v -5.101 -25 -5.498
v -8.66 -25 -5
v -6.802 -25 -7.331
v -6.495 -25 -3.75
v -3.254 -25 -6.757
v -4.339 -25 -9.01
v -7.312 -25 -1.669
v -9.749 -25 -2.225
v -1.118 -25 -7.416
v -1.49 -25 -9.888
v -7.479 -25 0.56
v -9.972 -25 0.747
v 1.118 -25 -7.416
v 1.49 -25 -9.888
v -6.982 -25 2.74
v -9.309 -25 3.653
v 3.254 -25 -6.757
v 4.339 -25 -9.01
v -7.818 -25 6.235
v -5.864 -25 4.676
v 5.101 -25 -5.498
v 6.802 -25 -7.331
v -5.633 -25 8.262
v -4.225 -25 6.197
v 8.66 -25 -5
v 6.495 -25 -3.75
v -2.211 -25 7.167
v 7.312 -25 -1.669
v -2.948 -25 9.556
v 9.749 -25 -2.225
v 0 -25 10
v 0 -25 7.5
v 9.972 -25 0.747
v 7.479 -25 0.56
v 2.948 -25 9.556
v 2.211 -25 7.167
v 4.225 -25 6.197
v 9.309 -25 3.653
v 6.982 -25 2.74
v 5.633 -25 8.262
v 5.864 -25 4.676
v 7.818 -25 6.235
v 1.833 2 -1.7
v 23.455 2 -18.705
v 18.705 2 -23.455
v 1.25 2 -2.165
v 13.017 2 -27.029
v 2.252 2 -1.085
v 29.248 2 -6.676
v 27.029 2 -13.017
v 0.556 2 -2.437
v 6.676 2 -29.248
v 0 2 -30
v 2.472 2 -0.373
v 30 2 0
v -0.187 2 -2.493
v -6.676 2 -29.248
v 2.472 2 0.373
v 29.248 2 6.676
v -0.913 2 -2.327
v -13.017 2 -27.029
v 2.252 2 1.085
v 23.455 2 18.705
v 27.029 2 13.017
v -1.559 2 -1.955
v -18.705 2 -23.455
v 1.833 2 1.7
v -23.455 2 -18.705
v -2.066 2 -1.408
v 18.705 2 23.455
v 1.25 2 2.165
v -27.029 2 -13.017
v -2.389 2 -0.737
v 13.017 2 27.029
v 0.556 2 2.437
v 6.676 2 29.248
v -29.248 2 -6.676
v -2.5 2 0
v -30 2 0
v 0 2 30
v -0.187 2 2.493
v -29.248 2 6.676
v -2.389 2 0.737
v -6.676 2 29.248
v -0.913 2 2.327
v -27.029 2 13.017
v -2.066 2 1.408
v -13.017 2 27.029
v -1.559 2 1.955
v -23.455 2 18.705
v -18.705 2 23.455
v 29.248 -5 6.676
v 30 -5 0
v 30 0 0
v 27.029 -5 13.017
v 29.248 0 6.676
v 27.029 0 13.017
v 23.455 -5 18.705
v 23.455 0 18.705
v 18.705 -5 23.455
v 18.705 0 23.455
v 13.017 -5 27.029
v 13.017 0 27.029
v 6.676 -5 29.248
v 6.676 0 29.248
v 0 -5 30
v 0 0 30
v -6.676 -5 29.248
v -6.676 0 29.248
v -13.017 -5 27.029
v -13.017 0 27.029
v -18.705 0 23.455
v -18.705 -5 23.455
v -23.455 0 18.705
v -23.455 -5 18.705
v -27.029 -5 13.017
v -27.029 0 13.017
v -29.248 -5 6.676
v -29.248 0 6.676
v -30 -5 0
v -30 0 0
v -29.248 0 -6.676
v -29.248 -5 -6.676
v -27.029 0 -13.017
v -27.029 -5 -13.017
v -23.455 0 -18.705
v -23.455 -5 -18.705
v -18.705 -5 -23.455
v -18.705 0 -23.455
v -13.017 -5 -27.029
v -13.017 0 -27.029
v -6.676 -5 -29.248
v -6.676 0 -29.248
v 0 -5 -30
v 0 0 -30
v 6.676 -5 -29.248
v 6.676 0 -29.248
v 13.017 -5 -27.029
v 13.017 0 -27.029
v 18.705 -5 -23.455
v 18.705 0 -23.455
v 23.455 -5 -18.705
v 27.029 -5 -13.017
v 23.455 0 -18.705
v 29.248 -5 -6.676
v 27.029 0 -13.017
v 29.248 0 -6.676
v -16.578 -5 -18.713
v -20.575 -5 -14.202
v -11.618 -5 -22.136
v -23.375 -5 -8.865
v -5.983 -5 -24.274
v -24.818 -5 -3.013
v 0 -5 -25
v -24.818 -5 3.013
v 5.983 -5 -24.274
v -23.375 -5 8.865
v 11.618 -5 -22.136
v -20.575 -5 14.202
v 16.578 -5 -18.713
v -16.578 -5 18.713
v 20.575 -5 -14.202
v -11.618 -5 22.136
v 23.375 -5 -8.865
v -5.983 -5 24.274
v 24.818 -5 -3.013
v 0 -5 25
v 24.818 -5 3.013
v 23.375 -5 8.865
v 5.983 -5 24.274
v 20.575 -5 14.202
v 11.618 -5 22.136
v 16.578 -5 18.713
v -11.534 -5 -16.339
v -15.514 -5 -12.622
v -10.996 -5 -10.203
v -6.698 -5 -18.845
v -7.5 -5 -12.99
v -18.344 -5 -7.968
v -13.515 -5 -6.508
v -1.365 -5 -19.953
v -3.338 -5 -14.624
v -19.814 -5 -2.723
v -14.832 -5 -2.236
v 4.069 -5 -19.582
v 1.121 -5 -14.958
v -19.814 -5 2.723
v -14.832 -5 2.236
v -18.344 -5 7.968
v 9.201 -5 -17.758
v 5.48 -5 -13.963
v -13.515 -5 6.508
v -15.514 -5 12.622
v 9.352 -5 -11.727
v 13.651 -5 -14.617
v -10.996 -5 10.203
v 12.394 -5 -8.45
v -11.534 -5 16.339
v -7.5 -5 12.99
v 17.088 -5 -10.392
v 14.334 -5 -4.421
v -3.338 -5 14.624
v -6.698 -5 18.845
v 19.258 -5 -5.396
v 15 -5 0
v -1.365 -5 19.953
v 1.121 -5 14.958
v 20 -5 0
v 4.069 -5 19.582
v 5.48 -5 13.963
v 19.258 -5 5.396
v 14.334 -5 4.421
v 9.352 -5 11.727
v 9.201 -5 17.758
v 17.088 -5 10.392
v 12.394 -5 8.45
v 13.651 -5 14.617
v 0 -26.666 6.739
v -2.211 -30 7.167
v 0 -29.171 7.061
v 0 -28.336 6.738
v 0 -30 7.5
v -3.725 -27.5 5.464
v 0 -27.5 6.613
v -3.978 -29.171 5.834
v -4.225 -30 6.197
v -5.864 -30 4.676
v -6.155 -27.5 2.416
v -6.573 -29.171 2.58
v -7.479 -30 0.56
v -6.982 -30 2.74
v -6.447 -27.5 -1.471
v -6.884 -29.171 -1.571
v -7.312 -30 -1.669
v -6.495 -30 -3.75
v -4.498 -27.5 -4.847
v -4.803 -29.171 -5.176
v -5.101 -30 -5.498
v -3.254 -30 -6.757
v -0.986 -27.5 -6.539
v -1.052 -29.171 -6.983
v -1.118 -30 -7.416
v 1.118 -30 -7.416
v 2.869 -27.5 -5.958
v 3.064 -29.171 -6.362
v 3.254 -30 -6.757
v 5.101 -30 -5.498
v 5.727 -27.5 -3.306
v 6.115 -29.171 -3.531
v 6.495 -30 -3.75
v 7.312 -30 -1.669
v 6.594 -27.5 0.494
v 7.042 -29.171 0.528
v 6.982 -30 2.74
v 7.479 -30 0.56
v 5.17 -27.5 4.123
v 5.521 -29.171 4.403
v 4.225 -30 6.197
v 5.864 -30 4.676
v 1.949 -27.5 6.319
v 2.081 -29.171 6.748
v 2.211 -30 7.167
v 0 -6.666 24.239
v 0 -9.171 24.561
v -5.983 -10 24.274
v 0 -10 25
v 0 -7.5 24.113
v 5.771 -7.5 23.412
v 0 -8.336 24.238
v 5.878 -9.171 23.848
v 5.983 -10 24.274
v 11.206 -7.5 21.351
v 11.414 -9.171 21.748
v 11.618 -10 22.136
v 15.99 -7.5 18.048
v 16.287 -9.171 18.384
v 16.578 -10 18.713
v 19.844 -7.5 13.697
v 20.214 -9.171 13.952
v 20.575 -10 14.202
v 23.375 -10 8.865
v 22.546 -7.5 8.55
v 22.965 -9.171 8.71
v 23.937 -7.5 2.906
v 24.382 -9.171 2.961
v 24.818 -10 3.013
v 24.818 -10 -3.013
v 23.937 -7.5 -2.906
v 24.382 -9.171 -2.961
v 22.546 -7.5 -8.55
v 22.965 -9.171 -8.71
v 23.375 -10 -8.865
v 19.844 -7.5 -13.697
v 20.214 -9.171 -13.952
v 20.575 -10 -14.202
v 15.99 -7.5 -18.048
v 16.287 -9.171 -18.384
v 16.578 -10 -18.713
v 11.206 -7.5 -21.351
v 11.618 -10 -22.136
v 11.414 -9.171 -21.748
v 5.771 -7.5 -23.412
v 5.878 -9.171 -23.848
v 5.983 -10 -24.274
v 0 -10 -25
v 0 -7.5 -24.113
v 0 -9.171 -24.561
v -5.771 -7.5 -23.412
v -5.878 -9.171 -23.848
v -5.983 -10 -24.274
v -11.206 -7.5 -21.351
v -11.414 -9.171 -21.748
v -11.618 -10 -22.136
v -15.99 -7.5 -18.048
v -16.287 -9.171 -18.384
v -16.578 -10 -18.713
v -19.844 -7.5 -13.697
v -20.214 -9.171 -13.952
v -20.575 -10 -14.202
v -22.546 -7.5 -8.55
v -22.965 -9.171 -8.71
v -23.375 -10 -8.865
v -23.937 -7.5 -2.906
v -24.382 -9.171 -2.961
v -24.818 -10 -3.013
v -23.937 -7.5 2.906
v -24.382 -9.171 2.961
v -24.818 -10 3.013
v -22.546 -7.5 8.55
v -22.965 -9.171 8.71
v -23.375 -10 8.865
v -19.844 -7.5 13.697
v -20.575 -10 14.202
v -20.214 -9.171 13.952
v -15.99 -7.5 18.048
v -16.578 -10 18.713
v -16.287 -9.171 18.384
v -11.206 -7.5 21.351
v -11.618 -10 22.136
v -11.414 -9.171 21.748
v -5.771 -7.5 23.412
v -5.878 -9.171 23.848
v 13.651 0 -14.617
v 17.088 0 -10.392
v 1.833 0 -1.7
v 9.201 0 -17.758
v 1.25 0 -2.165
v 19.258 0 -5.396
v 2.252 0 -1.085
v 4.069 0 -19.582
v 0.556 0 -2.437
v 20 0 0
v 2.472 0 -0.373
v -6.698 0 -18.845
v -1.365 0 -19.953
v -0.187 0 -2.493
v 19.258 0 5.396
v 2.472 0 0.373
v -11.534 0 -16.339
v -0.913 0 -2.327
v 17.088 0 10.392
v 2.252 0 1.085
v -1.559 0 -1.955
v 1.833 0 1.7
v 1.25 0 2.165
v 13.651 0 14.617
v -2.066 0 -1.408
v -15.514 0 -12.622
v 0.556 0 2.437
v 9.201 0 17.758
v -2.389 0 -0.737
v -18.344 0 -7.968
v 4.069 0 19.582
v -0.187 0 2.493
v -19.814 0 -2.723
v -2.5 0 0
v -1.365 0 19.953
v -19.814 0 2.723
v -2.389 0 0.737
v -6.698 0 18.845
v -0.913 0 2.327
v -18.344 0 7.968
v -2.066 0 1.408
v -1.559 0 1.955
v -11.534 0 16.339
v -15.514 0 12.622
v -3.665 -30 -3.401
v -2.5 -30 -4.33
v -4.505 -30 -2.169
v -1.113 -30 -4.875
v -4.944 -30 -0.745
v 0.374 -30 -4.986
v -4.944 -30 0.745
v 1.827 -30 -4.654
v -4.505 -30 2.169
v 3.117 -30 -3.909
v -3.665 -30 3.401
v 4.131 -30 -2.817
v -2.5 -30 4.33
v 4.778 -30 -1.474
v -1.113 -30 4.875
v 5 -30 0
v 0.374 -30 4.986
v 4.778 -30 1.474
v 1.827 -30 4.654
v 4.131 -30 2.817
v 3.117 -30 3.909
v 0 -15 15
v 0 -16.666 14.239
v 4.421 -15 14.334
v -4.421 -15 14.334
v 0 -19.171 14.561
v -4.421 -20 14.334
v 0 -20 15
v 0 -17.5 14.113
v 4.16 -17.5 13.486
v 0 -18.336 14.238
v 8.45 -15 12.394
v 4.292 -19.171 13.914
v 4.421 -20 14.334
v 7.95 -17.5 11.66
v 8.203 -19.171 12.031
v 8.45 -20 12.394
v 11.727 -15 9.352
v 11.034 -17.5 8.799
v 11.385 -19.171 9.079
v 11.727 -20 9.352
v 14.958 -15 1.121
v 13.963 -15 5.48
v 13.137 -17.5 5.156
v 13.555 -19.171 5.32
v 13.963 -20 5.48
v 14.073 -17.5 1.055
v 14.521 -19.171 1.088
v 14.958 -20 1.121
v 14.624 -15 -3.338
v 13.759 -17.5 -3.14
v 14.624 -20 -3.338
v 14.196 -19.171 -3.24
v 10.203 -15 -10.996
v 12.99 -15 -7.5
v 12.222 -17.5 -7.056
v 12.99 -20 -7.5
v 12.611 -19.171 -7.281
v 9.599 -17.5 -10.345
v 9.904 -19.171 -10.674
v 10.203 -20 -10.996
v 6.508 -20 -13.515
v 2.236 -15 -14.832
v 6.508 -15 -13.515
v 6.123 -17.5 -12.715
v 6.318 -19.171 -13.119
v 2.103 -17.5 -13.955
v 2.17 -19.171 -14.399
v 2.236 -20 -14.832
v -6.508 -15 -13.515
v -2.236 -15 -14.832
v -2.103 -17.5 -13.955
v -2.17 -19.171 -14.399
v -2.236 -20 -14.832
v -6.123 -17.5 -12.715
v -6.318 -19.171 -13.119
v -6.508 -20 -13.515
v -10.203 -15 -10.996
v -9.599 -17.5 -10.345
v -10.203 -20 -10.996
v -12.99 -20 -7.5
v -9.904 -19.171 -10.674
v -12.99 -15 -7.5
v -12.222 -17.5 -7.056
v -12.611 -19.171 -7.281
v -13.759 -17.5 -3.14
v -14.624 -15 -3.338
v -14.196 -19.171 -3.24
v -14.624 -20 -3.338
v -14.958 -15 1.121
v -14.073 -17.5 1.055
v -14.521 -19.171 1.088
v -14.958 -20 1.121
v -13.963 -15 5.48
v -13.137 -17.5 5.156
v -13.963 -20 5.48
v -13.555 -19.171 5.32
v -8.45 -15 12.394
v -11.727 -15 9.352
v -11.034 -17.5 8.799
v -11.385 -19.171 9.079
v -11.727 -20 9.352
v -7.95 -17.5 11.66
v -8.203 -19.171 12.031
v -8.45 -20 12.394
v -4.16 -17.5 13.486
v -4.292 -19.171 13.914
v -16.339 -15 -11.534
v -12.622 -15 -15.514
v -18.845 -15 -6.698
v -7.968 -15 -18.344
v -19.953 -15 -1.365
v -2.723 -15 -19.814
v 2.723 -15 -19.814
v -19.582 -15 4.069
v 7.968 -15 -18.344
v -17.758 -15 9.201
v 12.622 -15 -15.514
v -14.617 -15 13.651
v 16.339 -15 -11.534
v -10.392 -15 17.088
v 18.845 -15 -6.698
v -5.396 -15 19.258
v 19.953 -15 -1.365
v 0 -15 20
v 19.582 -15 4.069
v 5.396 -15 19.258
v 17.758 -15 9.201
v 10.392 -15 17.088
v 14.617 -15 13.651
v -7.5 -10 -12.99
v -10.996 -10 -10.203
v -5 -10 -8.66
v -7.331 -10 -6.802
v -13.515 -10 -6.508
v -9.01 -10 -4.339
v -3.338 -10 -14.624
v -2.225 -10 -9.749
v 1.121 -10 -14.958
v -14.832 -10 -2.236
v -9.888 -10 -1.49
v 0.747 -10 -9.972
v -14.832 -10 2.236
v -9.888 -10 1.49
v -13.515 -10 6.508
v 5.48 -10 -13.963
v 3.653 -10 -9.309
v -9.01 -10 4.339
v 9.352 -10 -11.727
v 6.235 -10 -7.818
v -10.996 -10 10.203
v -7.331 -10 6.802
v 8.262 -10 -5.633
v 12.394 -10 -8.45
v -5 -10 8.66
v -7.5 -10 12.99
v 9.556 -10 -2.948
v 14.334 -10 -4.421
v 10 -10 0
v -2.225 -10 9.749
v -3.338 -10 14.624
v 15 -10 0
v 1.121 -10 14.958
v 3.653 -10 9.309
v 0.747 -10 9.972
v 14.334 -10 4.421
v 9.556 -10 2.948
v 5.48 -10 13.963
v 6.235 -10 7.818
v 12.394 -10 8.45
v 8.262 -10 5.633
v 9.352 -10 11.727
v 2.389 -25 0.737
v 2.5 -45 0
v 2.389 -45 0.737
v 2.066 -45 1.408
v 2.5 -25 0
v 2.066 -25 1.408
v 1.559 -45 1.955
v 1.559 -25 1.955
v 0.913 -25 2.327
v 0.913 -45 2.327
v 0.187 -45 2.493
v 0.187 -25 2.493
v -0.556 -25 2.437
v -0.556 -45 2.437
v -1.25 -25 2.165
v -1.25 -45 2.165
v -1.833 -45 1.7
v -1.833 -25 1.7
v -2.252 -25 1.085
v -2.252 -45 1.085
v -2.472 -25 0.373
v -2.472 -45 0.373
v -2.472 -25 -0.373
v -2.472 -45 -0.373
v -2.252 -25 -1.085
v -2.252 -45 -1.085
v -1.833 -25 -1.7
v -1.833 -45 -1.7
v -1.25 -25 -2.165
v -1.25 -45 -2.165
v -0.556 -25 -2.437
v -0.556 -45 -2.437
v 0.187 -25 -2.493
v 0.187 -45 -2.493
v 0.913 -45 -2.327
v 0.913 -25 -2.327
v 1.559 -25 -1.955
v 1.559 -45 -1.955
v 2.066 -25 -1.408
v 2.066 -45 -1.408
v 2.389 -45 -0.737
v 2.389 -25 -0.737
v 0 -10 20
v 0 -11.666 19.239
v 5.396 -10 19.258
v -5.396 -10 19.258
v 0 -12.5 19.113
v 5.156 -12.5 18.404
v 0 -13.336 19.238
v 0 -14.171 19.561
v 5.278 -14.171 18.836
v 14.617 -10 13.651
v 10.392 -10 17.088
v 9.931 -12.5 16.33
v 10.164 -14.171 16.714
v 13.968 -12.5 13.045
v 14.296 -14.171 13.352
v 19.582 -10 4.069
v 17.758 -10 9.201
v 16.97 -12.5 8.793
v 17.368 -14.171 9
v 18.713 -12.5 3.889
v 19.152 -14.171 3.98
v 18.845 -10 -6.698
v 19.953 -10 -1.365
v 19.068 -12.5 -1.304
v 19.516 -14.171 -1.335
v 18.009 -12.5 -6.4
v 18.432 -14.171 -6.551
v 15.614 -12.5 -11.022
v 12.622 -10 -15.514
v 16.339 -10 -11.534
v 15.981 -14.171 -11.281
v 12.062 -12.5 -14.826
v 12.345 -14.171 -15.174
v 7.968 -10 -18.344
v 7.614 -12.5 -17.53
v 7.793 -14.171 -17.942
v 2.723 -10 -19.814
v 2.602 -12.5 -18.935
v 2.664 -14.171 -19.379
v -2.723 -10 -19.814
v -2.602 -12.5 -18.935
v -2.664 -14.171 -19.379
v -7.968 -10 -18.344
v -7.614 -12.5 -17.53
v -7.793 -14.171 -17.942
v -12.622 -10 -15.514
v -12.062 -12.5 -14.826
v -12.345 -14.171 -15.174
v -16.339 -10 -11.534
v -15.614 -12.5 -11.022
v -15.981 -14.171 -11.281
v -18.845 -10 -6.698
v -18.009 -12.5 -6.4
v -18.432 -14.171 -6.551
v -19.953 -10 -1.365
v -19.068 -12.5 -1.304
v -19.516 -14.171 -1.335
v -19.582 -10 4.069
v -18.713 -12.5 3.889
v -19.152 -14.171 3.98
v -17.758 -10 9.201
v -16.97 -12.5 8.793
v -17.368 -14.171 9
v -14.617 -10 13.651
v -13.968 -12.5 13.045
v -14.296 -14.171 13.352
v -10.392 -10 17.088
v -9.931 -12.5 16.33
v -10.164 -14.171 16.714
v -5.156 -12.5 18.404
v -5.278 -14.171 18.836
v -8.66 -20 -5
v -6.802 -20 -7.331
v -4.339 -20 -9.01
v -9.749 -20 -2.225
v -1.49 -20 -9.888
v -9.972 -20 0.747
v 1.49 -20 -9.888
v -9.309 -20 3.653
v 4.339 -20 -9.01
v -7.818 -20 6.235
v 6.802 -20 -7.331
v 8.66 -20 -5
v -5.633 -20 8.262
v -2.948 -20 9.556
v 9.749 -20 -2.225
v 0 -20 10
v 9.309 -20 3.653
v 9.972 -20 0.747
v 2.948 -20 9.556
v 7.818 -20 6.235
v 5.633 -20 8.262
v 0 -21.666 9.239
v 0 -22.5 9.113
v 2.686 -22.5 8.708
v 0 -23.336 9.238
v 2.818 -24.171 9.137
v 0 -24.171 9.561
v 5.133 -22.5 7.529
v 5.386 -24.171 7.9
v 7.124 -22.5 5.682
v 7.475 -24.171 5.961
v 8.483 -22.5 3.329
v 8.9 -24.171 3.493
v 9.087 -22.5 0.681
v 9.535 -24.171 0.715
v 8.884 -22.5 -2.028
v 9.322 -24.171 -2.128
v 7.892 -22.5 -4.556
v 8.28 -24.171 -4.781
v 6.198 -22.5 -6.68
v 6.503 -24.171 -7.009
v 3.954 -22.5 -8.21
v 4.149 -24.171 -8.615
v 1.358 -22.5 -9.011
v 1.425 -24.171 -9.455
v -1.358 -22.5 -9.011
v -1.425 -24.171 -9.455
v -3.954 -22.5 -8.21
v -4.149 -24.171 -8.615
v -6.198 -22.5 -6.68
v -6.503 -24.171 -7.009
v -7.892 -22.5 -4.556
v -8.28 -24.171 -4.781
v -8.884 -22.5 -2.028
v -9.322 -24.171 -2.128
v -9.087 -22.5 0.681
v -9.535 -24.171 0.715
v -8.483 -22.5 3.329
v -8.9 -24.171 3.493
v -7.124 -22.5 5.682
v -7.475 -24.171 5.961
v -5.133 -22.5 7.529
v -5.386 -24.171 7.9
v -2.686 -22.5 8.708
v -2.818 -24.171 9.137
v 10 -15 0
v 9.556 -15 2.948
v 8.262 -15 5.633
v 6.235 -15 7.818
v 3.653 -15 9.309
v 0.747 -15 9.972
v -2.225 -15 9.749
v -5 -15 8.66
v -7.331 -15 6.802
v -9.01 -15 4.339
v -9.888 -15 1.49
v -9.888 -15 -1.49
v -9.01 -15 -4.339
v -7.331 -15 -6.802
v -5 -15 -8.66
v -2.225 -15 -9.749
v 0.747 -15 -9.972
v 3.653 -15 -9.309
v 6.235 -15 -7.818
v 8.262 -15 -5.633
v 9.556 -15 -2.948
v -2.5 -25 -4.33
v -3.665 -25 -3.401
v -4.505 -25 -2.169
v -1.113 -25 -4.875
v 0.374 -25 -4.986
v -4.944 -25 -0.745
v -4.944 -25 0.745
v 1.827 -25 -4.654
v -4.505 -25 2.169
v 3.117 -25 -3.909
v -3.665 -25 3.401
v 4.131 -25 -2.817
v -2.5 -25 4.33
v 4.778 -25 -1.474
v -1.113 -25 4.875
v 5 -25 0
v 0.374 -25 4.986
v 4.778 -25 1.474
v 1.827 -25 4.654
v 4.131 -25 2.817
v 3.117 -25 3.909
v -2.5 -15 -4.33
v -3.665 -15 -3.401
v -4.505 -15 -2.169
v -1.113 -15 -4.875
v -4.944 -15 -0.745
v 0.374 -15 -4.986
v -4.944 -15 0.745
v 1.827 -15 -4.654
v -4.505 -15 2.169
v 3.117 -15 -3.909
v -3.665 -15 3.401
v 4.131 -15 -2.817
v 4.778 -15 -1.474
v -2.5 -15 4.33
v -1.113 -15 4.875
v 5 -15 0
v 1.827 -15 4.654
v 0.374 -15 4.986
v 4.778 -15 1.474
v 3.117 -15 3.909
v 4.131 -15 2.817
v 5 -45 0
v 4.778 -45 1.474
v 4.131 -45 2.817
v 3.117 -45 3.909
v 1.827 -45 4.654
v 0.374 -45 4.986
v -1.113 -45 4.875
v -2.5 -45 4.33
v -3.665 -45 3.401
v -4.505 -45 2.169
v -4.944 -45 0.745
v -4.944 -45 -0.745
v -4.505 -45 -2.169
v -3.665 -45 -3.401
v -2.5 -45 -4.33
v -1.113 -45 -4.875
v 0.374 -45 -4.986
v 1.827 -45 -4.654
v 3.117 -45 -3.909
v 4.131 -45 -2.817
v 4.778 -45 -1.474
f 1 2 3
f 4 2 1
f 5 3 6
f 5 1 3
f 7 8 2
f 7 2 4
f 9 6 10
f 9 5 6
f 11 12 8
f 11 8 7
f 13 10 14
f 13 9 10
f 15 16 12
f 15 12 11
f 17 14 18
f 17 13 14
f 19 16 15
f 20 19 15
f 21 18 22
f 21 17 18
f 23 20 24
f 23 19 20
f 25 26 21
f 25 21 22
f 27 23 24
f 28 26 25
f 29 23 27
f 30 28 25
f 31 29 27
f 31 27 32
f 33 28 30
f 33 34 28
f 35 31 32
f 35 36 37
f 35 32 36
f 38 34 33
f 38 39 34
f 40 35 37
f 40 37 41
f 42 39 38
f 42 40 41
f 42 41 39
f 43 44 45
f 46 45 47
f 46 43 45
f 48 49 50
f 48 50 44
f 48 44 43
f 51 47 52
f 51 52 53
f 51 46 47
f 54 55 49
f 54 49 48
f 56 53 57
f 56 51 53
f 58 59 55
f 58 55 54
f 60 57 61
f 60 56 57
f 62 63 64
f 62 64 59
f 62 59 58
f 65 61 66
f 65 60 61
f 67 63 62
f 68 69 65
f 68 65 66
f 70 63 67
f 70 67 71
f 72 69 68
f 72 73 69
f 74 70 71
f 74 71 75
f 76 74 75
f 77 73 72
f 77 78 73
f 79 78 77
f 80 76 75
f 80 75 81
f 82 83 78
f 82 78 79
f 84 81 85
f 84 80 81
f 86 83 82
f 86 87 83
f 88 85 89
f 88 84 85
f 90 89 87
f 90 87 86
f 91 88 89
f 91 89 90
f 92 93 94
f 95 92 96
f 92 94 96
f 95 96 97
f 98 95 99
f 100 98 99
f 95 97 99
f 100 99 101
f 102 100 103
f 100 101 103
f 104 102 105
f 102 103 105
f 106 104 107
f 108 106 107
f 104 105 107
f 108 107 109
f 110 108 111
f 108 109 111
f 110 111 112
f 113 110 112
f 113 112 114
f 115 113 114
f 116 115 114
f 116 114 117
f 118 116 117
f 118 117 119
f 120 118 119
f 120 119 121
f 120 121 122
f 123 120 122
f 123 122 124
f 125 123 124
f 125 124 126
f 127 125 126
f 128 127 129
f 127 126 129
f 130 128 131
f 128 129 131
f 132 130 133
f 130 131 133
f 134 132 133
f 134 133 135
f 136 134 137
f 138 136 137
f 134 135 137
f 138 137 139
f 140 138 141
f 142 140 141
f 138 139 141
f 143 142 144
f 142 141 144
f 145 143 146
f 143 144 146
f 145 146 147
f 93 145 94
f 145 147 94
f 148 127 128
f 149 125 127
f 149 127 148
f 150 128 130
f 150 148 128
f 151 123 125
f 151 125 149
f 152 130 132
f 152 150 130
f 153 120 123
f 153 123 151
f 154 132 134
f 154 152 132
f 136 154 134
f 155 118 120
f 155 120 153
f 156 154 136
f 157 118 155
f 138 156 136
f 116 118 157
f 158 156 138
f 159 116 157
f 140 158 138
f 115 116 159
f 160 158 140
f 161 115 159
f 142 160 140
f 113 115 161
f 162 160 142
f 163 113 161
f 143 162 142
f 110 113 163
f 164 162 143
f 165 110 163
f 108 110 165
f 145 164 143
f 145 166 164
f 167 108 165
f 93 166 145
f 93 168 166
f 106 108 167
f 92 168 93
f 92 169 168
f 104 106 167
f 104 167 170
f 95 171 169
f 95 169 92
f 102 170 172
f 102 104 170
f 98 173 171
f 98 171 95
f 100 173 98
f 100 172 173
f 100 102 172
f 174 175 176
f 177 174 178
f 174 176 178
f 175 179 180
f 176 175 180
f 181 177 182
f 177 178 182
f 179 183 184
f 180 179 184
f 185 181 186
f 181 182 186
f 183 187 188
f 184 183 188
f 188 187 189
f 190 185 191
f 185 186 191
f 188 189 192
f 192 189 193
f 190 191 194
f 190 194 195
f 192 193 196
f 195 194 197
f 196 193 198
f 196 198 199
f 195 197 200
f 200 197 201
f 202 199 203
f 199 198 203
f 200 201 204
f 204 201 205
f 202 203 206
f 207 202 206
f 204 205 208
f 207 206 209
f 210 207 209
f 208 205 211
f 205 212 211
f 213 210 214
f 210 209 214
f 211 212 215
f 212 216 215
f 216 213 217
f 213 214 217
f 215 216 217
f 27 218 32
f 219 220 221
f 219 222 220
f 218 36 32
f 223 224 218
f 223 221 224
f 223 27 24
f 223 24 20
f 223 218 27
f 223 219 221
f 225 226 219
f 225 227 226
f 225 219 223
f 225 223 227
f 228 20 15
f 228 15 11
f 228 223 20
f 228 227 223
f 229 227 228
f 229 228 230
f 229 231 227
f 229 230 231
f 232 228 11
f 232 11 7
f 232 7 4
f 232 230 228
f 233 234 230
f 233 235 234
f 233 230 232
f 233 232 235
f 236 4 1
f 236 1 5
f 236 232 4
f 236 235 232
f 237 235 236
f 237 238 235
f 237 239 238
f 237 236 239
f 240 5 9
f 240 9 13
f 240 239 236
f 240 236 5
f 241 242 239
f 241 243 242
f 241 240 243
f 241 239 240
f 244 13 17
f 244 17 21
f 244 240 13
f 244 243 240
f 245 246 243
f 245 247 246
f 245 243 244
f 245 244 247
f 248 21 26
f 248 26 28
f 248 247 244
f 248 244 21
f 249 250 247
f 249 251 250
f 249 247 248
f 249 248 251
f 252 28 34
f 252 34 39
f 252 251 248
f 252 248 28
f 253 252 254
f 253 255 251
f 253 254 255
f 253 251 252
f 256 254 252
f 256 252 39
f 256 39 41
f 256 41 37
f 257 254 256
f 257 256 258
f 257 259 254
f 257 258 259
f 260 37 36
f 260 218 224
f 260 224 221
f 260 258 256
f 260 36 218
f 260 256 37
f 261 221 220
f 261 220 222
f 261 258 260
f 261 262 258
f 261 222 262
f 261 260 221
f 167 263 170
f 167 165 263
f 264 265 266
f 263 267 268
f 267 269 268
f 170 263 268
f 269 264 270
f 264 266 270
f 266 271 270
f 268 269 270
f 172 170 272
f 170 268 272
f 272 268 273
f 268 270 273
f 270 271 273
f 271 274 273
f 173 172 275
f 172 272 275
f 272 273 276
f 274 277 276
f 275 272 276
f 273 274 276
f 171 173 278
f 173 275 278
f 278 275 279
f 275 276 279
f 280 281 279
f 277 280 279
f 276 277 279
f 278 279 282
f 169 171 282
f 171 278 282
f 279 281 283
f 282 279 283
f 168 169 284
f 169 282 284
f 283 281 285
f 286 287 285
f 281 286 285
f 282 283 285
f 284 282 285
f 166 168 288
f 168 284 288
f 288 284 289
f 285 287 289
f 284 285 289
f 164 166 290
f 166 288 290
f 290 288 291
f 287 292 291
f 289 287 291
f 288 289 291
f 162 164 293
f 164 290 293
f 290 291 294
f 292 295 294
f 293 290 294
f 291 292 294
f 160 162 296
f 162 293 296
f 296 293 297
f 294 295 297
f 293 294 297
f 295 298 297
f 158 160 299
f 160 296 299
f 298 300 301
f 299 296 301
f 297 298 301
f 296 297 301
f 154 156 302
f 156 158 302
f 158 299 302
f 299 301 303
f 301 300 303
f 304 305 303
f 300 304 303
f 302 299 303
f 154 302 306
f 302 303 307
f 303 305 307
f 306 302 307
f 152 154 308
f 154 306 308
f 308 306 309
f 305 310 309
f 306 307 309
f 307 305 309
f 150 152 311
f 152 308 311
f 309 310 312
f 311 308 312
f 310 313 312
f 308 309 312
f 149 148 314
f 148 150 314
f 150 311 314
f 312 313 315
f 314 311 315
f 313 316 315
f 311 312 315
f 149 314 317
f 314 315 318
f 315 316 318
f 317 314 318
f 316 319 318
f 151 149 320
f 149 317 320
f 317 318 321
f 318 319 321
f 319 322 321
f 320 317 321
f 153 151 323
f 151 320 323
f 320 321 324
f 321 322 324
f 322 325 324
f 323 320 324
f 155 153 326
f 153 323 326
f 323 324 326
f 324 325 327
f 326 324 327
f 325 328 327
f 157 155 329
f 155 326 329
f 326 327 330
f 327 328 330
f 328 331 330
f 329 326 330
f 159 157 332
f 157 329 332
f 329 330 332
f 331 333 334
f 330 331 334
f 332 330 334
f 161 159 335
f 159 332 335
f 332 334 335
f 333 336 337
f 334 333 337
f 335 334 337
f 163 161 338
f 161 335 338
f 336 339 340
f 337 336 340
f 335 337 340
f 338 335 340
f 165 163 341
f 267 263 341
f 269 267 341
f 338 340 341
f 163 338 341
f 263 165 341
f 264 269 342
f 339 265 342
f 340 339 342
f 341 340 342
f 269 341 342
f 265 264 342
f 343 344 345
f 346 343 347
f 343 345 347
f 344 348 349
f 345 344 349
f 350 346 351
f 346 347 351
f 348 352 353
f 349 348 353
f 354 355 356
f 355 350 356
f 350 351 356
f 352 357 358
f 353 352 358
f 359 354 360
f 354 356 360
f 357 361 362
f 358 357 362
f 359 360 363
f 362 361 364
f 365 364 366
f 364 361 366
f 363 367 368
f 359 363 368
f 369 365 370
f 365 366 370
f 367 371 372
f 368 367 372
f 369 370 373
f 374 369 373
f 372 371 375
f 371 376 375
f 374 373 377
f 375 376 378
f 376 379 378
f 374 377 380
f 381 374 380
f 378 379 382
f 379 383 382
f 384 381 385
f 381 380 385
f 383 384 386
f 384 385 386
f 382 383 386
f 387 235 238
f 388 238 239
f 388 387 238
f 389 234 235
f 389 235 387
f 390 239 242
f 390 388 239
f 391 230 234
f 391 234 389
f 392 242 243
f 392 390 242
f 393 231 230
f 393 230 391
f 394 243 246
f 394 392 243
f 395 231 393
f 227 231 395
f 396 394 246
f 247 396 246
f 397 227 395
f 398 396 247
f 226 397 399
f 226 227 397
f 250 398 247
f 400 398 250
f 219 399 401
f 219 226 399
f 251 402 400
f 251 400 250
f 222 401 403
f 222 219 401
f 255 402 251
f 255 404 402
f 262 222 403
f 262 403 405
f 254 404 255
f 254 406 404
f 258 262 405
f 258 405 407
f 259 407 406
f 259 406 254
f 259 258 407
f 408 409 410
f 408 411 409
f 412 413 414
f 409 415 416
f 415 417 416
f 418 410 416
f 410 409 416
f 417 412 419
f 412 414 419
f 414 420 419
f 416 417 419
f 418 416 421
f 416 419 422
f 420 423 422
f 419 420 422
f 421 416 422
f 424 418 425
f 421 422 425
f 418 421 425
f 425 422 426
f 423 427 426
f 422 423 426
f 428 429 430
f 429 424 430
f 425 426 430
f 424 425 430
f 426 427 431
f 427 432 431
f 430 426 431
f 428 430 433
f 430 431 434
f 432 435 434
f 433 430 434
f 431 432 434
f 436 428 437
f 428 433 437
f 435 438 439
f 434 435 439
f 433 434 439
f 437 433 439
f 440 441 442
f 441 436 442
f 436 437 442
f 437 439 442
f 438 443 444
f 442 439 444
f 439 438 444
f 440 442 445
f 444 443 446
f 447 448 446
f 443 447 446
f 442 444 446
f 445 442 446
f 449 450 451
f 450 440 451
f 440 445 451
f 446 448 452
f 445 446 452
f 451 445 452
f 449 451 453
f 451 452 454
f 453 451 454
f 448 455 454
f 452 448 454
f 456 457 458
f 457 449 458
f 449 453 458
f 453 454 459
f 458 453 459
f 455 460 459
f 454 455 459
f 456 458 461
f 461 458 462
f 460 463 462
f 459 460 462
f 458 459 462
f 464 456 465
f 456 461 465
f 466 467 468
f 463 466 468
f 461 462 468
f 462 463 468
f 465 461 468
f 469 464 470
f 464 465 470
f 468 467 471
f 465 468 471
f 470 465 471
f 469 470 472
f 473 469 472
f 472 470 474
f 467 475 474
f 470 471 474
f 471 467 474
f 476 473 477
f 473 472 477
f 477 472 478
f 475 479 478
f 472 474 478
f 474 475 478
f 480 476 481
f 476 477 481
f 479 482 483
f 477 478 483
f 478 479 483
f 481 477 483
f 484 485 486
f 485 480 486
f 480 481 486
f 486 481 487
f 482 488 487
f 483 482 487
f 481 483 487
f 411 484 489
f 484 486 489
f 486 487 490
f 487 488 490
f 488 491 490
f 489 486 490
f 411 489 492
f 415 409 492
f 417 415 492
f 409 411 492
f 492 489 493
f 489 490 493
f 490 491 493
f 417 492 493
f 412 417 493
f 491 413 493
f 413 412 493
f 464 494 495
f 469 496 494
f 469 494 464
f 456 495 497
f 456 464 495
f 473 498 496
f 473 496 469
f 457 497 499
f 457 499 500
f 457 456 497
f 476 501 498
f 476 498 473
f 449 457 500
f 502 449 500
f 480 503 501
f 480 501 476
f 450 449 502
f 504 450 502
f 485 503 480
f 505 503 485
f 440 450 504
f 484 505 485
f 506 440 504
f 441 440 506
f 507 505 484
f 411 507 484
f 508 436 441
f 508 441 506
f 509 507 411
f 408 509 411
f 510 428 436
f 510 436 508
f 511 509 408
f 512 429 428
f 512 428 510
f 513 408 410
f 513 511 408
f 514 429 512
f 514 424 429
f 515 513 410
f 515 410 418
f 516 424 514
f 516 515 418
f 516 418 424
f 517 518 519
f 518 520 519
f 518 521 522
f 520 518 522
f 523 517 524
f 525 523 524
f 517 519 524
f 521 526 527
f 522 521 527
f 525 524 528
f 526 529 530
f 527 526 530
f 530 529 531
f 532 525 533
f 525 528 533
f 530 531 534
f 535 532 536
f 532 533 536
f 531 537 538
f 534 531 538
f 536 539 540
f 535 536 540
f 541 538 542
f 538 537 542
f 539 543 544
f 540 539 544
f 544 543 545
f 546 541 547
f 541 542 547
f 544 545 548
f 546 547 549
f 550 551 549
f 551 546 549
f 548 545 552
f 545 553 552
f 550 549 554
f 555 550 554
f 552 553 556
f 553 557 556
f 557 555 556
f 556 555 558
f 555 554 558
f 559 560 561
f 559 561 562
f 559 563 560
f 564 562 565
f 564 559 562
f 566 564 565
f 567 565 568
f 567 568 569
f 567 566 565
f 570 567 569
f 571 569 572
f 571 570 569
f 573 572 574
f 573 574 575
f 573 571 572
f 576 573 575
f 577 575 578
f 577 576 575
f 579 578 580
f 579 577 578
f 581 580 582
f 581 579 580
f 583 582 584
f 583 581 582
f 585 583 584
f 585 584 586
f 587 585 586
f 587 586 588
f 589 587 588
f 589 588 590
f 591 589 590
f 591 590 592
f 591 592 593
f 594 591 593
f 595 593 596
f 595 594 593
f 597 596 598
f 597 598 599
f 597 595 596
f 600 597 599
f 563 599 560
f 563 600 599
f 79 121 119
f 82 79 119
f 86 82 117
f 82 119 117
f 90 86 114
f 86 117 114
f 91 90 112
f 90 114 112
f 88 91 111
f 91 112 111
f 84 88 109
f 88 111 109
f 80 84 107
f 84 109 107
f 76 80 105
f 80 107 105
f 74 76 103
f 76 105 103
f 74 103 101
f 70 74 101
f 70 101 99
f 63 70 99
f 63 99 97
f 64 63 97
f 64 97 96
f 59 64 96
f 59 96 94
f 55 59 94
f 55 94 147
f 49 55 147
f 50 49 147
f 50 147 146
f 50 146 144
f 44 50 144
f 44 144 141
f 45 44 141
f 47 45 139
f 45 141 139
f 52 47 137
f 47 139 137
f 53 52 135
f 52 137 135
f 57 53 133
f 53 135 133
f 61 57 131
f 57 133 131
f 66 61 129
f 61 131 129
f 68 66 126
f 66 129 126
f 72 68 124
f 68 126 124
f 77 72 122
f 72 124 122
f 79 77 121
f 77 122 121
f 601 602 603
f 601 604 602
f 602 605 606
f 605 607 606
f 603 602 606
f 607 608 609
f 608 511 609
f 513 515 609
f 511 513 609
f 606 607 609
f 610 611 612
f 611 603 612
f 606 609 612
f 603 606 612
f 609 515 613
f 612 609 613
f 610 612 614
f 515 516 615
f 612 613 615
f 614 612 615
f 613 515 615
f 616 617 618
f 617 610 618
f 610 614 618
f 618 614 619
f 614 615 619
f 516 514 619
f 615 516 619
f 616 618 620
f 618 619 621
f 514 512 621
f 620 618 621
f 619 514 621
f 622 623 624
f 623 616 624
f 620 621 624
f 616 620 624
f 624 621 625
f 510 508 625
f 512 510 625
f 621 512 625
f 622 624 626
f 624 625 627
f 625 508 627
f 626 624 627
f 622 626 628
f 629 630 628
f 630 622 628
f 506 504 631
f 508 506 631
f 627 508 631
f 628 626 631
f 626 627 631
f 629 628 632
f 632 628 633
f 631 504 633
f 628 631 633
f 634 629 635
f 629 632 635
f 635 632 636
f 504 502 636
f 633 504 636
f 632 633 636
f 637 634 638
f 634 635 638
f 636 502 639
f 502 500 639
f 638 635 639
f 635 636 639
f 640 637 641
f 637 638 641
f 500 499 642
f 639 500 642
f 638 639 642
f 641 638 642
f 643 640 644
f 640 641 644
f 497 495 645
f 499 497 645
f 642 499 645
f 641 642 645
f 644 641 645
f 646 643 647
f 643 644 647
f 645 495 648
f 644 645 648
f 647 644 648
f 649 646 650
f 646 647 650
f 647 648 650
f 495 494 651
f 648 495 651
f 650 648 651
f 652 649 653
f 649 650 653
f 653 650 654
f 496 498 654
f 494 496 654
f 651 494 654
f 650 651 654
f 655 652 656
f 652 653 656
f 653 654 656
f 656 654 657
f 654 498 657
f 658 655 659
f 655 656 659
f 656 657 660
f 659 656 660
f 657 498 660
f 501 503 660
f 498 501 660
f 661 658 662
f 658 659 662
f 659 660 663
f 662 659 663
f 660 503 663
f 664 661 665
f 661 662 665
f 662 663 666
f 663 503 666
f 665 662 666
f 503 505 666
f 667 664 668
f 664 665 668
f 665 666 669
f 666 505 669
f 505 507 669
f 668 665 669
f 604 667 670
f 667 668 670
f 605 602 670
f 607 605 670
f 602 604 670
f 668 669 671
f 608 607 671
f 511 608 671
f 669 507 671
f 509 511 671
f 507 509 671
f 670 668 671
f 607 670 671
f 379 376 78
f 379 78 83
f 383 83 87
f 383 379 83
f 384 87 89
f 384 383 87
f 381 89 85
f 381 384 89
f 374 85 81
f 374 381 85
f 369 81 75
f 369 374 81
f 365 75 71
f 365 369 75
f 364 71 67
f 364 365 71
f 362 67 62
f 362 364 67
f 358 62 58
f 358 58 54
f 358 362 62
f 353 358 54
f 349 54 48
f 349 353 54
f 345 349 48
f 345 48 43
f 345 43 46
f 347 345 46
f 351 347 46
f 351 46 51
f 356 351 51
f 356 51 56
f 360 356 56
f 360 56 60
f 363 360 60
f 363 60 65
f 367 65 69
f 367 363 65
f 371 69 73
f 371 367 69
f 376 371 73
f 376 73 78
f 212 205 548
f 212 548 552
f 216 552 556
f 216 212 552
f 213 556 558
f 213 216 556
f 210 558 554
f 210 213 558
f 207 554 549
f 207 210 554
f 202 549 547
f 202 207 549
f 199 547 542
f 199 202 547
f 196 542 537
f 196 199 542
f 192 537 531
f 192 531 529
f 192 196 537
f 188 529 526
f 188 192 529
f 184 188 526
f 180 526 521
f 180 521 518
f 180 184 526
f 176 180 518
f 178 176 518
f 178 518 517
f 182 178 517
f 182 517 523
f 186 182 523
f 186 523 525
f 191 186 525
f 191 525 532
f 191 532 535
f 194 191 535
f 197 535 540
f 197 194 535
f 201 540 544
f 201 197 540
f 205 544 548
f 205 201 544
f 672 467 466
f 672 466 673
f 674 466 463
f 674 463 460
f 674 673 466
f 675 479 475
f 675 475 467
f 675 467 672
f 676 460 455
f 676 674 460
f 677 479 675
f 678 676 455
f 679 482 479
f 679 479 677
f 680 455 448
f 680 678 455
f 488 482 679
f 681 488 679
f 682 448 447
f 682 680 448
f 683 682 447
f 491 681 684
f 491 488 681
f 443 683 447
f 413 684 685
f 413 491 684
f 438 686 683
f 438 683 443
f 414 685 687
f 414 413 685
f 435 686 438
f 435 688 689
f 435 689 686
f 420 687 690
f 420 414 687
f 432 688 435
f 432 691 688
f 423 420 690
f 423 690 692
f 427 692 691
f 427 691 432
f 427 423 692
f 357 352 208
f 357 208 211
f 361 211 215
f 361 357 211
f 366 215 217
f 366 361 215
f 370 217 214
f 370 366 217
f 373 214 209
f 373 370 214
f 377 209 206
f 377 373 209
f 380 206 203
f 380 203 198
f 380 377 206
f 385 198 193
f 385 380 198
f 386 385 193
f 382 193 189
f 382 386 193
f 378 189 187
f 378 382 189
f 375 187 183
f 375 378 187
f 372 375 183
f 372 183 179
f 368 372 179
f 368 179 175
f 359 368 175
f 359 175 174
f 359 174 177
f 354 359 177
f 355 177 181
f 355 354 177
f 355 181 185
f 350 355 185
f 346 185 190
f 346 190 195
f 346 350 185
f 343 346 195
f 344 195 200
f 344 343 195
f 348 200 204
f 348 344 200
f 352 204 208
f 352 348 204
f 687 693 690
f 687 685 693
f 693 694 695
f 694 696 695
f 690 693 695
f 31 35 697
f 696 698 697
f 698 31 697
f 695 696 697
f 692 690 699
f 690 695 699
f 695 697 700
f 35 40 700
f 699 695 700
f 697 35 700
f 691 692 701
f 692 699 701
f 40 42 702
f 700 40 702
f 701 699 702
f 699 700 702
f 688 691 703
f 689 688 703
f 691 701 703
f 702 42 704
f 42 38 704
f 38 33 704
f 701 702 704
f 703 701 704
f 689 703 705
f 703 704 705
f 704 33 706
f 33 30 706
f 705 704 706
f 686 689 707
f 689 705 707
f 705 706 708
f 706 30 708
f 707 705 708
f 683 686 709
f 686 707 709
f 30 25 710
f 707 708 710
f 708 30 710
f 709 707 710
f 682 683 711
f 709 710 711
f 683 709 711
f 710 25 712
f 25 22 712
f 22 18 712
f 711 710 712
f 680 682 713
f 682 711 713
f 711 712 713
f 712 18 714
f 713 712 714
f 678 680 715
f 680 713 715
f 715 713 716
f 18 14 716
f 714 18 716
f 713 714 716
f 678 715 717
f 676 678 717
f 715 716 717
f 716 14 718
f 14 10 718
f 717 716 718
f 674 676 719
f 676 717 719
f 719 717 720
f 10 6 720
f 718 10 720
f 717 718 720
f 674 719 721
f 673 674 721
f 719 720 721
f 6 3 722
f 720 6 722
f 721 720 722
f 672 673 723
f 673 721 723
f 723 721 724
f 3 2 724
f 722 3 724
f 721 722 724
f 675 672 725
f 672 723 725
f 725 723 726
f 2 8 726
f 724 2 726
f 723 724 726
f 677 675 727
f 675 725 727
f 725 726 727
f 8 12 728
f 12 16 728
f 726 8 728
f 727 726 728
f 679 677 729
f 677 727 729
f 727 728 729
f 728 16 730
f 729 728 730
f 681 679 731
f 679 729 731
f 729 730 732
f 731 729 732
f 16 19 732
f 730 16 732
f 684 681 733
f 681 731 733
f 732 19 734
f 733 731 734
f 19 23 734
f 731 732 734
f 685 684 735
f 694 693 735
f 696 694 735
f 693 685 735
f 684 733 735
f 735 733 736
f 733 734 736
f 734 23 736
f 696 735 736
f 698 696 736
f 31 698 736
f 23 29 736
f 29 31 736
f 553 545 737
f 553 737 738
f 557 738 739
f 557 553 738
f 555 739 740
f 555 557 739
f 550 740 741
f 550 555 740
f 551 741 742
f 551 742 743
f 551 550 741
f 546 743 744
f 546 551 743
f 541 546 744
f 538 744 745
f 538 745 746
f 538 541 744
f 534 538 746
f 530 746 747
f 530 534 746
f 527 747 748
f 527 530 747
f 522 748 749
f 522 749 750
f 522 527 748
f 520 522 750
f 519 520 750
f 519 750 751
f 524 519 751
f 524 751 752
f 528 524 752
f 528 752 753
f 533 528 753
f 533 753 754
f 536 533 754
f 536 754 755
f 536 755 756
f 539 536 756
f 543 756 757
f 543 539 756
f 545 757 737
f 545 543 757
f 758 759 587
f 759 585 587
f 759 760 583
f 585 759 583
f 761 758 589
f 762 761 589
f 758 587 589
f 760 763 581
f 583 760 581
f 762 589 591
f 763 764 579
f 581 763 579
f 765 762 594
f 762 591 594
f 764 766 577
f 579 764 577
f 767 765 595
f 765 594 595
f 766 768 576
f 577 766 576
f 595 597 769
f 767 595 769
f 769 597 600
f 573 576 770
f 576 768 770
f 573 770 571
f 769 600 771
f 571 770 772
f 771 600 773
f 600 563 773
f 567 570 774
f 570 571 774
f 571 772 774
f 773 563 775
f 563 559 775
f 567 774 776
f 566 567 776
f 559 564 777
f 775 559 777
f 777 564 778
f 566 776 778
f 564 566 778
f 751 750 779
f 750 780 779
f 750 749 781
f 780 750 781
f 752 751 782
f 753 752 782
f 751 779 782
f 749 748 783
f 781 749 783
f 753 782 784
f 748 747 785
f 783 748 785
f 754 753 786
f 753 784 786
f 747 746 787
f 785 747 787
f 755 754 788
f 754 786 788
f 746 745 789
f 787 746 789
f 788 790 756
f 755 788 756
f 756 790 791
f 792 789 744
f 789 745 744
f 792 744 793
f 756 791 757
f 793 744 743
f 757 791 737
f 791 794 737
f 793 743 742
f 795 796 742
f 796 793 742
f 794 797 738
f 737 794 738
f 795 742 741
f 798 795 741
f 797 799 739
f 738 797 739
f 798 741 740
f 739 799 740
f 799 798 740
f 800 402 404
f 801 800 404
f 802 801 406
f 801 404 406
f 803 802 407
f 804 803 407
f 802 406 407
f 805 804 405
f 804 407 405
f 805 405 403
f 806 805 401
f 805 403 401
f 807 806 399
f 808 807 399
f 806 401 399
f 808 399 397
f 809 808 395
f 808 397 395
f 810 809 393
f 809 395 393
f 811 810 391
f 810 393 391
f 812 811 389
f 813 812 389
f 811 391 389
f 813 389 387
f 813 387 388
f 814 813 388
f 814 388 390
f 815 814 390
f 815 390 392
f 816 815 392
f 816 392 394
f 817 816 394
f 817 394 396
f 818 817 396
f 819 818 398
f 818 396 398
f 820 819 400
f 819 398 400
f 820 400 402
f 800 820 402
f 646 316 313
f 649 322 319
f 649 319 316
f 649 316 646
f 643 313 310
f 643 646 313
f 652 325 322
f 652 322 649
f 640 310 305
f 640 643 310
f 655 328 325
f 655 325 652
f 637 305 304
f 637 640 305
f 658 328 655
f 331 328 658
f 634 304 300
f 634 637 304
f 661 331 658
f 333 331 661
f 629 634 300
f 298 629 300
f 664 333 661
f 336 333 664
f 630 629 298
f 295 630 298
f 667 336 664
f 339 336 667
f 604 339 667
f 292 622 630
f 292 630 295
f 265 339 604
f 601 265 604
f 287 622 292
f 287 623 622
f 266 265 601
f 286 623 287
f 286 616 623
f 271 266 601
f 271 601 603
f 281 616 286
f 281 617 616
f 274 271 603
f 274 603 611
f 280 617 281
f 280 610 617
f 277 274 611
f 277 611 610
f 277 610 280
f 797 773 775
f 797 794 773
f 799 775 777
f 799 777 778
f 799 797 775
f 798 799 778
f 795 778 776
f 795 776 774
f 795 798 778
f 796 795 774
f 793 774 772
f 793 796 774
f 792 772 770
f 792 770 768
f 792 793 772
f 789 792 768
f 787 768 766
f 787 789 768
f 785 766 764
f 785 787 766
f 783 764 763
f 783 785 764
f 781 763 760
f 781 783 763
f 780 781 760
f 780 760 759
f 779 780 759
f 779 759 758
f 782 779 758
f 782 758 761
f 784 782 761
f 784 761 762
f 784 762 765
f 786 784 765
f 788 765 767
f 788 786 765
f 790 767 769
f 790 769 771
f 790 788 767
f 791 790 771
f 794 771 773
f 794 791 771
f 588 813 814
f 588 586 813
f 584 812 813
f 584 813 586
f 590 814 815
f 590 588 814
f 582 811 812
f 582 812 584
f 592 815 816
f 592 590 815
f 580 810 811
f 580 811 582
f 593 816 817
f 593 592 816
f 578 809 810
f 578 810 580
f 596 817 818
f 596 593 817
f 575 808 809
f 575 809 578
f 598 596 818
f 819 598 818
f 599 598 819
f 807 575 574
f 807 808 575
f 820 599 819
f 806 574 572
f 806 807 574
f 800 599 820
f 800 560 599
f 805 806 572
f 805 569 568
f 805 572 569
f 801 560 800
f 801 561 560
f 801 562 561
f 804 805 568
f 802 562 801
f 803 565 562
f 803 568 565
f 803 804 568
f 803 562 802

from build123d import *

# Parameters (mm, degrees)
F0_R      = 30
F0_R_2    = 20
F1_DEPTH  = 5
F2_R      = 25
F2_R_2    = 20
F2_R_3    = 15
F3_DEPTH  = 5
F4_R      = 20
F4_R_2    = 15
F4_R_3    = 10
F5_DEPTH  = 5
F6_R      = 15
F6_R_2    = 10
F6_R_3    = 5
F7_DEPTH  = 5
F8_R      = 10
F8_R_2    = 5
F9_DEPTH  = 5
F13_R     = 7.5
F13_R_2   = 5
F13_R_3   = 2.5
F14_DEPTH = 5
F15_R     = 5
F15_R_2   = 2.5
F16_DEPTH = 15
F19_R     = 30
F19_R_2   = 2.5
F20_DEPTH = 2


with BuildPart() as f1:
    # F0 (on Front) → F1 (new body)
    with BuildSketch(Plane.XZ):
        Circle(F0_R)
        Circle(F0_R_2, mode=Mode.SUBTRACT)
    extrude(amount=F1_DEPTH)

    # F2 (on face) → F3 (join)
    with BuildSketch(Plane.XZ.offset(5)):
        Circle(F2_R)
        Circle(F2_R_2, mode=Mode.SUBTRACT)
        Circle(F2_R_2)
        Circle(F2_R_3, mode=Mode.SUBTRACT)
    extrude(amount=F3_DEPTH)

    # F4 (on face) → F5 (join)
    with BuildSketch(Plane.XZ.offset(10)):
        Circle(F4_R)
        Circle(F4_R_2, mode=Mode.SUBTRACT)
        Circle(F4_R_2)
        Circle(F4_R_3, mode=Mode.SUBTRACT)
    extrude(amount=F5_DEPTH)

    # F6 (on face) → F7 (join)
    with BuildSketch(Plane.XZ.offset(15)):
        Circle(F6_R)
        Circle(F6_R_2, mode=Mode.SUBTRACT)
        Circle(F6_R_2)
        Circle(F6_R_3, mode=Mode.SUBTRACT)
    extrude(amount=F7_DEPTH)

    # F8 (on face) → F9 (join)
    with BuildSketch(Plane.XZ.offset(20)):
        Circle(F8_R)
        Circle(F8_R_2, mode=Mode.SUBTRACT)
    extrude(amount=F9_DEPTH)

    # F10 (on Right) → F12 (revolve, cut)
    with BuildSketch(Plane.YZ):
        with BuildLine():
            add(Edge.make_bspline(
                [(-5, 25), (-5.8326505031, 24.531605213), (-7.4963397946, 23.693799982), (-9.1746699077, 24.5308889348), (-10, 25)],
                knots=[0, 0, 0, 0, 0.5, 1, 1, 1, 1], degree=3))
            Line((-5, 25), (-10, 25))
        make_face()
        with BuildLine():
            add(Edge.make_bspline(
                [(-10, 20), (-10.8326505031, 19.531605213), (-12.4963397946, 18.693799982), (-14.1746699077, 19.5308889348), (-15, 20)],
                knots=[0, 0, 0, 0, 0.5, 1, 1, 1, 1], degree=3))
            Line((-10, 20), (-15, 20))
        make_face()
        with BuildLine():
            add(Edge.make_bspline(
                [(-15, 15), (-15.8326505031, 14.531605213), (-17.4963397946, 13.693799982), (-19.1746699077, 14.5308889348), (-20, 15)],
                knots=[0, 0, 0, 0, 0.5, 1, 1, 1, 1], degree=3))
            Line((-15, 15), (-20, 15))
        make_face()
        with BuildLine():
            add(Edge.make_bspline(
                [(-20, 10), (-20.8326505031, 9.531605213), (-22.4963397946, 8.693799982), (-24.1746699077, 9.5308889348), (-25, 10)],
                knots=[0, 0, 0, 0, 0.5, 1, 1, 1, 1], degree=3))
            Line((-20, 10), (-25, 10))
        make_face()
    revolve(axis=Axis((0, 20.6356514245, 0), (0, 1, 0)), mode=Mode.SUBTRACT)

    # F13 (on face) → F14 (join)
    with BuildSketch(Plane.XZ.offset(25)):
        Circle(F13_R)
        Circle(F13_R_2, mode=Mode.SUBTRACT)
        Circle(F13_R_2)
        Circle(F13_R_3, mode=Mode.SUBTRACT)
    extrude(amount=F14_DEPTH)

    # F15 (on face) → F16 (join)
    with BuildSketch(Plane.XZ.offset(30)):
        Circle(F15_R)
        Circle(F15_R_2, mode=Mode.SUBTRACT)
    extrude(amount=F16_DEPTH)

    # F17 (on Right) → F18 (revolve, cut)
    with BuildSketch(Plane.YZ):
        with BuildLine():
            add(Edge.make_bspline(
                [(-25, 7.5), (-25.8326505031, 7.031605213), (-27.4963397946, 6.193799982), (-29.1746699077, 7.0308889348), (-30, 7.5)],
                knots=[0, 0, 0, 0, 0.5, 1, 1, 1, 1], degree=3))
            Line((-25, 7.5), (-30, 7.5))
        make_face()
    revolve(axis=Axis((0, -30.2864443511, 0), (0, -1, 0)), mode=Mode.SUBTRACT)

    # F19 (on face) → F20 (join)
    with BuildSketch(Plane(origin=(0, 0, 0), x_dir=(-1, 0, 0), z_dir=(0, 1, 0))):
        Circle(F19_R)
        Circle(F19_R_2, mode=Mode.SUBTRACT)
    extrude(amount=F20_DEPTH)


solid = f1.part
